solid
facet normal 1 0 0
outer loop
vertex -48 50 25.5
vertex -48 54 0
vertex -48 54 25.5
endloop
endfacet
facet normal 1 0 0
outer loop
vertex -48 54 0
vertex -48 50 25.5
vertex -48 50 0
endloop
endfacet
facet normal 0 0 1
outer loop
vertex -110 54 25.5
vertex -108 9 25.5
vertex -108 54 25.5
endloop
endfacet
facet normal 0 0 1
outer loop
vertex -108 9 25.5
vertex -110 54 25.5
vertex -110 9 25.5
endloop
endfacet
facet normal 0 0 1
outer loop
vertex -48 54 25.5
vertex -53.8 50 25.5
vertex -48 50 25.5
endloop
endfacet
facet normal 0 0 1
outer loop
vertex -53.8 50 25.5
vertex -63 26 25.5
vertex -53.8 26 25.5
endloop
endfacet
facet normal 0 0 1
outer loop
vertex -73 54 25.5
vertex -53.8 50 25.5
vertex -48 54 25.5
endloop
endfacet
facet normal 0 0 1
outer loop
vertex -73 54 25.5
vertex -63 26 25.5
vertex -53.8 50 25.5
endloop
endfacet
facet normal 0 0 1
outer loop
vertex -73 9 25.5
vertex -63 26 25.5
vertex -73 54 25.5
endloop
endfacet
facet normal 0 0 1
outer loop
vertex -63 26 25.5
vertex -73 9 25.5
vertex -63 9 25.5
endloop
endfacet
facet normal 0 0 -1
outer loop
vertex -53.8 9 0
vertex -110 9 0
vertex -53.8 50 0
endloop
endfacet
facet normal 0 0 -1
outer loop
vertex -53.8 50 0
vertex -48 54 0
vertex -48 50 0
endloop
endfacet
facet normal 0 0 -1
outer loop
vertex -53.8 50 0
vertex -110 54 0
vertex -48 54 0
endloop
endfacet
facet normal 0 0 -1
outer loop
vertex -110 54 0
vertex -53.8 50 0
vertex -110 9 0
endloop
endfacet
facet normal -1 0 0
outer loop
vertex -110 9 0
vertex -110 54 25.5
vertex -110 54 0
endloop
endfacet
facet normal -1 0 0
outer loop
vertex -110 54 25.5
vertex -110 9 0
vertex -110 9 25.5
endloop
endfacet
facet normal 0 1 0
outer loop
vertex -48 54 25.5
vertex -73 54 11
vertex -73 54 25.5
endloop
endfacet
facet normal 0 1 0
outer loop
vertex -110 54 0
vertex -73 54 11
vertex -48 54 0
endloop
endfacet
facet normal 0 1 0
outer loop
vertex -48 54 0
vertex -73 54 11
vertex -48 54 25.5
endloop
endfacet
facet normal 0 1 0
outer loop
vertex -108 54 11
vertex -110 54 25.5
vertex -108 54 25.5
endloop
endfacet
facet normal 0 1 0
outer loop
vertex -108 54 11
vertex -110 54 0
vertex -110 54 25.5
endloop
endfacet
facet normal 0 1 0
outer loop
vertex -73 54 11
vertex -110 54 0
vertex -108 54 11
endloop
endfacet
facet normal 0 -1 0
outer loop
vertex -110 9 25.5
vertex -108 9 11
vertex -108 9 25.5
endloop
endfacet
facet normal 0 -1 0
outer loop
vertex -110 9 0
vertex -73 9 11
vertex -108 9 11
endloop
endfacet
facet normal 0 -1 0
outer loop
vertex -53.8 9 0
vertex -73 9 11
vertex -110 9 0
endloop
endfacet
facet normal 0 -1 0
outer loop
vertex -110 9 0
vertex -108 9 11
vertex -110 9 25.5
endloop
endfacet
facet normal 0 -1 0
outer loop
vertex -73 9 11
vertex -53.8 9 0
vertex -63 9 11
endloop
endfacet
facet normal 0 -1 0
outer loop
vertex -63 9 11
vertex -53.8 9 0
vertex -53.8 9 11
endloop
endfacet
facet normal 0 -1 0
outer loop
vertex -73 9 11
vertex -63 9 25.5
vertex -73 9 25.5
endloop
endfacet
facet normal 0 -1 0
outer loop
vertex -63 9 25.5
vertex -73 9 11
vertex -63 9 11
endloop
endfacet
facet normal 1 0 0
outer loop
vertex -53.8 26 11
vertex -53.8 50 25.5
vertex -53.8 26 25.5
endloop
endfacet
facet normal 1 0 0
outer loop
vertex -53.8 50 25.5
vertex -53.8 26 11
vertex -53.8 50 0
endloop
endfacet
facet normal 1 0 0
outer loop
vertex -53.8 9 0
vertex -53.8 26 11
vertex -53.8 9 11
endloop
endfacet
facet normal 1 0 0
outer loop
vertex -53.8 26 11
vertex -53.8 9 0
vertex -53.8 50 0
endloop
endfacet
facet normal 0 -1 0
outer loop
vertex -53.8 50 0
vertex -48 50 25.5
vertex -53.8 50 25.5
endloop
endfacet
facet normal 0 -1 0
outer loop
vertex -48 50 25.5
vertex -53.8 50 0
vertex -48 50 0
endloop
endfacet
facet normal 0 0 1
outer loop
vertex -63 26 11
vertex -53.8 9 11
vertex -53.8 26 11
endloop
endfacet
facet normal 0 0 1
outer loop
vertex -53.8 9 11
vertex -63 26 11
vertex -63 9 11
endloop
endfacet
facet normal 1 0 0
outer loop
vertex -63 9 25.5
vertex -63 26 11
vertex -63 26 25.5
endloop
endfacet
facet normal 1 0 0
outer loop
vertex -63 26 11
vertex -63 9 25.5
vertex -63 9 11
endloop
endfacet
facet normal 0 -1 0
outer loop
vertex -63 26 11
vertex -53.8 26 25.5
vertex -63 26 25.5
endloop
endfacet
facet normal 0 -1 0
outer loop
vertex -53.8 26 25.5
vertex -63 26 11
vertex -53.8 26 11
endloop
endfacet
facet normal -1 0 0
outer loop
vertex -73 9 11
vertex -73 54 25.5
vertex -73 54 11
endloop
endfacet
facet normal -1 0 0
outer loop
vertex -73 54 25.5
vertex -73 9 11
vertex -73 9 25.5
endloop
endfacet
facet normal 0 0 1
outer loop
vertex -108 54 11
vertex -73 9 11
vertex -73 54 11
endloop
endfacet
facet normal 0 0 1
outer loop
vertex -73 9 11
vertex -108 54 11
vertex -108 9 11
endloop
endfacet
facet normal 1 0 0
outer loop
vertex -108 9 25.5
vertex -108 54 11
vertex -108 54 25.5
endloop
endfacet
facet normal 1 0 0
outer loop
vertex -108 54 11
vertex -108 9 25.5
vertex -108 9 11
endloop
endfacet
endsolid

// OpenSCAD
intersection() {
    difference () {
        // main
        translate([-110,9,0]) {
            cube([62,45,25.5]);
        };
        // rj9 - right cut
        translate([-53.8,0,0]) {
            rotate (a=0, v=[0,0,1]) {
                cube([18,50,30]);
            }
        };
        // back cut
        translate([-63,0,11]) {
            rotate (a=0, v=[0,0,1]) {
                cube([18,26,30]);
            }
        };
        // usb - left cut
        translate([-108,9,11]) {
            rotate (a=0, v=[0,0,1]) {
                cube([35,78,19]);
            }
        };
    }
}
